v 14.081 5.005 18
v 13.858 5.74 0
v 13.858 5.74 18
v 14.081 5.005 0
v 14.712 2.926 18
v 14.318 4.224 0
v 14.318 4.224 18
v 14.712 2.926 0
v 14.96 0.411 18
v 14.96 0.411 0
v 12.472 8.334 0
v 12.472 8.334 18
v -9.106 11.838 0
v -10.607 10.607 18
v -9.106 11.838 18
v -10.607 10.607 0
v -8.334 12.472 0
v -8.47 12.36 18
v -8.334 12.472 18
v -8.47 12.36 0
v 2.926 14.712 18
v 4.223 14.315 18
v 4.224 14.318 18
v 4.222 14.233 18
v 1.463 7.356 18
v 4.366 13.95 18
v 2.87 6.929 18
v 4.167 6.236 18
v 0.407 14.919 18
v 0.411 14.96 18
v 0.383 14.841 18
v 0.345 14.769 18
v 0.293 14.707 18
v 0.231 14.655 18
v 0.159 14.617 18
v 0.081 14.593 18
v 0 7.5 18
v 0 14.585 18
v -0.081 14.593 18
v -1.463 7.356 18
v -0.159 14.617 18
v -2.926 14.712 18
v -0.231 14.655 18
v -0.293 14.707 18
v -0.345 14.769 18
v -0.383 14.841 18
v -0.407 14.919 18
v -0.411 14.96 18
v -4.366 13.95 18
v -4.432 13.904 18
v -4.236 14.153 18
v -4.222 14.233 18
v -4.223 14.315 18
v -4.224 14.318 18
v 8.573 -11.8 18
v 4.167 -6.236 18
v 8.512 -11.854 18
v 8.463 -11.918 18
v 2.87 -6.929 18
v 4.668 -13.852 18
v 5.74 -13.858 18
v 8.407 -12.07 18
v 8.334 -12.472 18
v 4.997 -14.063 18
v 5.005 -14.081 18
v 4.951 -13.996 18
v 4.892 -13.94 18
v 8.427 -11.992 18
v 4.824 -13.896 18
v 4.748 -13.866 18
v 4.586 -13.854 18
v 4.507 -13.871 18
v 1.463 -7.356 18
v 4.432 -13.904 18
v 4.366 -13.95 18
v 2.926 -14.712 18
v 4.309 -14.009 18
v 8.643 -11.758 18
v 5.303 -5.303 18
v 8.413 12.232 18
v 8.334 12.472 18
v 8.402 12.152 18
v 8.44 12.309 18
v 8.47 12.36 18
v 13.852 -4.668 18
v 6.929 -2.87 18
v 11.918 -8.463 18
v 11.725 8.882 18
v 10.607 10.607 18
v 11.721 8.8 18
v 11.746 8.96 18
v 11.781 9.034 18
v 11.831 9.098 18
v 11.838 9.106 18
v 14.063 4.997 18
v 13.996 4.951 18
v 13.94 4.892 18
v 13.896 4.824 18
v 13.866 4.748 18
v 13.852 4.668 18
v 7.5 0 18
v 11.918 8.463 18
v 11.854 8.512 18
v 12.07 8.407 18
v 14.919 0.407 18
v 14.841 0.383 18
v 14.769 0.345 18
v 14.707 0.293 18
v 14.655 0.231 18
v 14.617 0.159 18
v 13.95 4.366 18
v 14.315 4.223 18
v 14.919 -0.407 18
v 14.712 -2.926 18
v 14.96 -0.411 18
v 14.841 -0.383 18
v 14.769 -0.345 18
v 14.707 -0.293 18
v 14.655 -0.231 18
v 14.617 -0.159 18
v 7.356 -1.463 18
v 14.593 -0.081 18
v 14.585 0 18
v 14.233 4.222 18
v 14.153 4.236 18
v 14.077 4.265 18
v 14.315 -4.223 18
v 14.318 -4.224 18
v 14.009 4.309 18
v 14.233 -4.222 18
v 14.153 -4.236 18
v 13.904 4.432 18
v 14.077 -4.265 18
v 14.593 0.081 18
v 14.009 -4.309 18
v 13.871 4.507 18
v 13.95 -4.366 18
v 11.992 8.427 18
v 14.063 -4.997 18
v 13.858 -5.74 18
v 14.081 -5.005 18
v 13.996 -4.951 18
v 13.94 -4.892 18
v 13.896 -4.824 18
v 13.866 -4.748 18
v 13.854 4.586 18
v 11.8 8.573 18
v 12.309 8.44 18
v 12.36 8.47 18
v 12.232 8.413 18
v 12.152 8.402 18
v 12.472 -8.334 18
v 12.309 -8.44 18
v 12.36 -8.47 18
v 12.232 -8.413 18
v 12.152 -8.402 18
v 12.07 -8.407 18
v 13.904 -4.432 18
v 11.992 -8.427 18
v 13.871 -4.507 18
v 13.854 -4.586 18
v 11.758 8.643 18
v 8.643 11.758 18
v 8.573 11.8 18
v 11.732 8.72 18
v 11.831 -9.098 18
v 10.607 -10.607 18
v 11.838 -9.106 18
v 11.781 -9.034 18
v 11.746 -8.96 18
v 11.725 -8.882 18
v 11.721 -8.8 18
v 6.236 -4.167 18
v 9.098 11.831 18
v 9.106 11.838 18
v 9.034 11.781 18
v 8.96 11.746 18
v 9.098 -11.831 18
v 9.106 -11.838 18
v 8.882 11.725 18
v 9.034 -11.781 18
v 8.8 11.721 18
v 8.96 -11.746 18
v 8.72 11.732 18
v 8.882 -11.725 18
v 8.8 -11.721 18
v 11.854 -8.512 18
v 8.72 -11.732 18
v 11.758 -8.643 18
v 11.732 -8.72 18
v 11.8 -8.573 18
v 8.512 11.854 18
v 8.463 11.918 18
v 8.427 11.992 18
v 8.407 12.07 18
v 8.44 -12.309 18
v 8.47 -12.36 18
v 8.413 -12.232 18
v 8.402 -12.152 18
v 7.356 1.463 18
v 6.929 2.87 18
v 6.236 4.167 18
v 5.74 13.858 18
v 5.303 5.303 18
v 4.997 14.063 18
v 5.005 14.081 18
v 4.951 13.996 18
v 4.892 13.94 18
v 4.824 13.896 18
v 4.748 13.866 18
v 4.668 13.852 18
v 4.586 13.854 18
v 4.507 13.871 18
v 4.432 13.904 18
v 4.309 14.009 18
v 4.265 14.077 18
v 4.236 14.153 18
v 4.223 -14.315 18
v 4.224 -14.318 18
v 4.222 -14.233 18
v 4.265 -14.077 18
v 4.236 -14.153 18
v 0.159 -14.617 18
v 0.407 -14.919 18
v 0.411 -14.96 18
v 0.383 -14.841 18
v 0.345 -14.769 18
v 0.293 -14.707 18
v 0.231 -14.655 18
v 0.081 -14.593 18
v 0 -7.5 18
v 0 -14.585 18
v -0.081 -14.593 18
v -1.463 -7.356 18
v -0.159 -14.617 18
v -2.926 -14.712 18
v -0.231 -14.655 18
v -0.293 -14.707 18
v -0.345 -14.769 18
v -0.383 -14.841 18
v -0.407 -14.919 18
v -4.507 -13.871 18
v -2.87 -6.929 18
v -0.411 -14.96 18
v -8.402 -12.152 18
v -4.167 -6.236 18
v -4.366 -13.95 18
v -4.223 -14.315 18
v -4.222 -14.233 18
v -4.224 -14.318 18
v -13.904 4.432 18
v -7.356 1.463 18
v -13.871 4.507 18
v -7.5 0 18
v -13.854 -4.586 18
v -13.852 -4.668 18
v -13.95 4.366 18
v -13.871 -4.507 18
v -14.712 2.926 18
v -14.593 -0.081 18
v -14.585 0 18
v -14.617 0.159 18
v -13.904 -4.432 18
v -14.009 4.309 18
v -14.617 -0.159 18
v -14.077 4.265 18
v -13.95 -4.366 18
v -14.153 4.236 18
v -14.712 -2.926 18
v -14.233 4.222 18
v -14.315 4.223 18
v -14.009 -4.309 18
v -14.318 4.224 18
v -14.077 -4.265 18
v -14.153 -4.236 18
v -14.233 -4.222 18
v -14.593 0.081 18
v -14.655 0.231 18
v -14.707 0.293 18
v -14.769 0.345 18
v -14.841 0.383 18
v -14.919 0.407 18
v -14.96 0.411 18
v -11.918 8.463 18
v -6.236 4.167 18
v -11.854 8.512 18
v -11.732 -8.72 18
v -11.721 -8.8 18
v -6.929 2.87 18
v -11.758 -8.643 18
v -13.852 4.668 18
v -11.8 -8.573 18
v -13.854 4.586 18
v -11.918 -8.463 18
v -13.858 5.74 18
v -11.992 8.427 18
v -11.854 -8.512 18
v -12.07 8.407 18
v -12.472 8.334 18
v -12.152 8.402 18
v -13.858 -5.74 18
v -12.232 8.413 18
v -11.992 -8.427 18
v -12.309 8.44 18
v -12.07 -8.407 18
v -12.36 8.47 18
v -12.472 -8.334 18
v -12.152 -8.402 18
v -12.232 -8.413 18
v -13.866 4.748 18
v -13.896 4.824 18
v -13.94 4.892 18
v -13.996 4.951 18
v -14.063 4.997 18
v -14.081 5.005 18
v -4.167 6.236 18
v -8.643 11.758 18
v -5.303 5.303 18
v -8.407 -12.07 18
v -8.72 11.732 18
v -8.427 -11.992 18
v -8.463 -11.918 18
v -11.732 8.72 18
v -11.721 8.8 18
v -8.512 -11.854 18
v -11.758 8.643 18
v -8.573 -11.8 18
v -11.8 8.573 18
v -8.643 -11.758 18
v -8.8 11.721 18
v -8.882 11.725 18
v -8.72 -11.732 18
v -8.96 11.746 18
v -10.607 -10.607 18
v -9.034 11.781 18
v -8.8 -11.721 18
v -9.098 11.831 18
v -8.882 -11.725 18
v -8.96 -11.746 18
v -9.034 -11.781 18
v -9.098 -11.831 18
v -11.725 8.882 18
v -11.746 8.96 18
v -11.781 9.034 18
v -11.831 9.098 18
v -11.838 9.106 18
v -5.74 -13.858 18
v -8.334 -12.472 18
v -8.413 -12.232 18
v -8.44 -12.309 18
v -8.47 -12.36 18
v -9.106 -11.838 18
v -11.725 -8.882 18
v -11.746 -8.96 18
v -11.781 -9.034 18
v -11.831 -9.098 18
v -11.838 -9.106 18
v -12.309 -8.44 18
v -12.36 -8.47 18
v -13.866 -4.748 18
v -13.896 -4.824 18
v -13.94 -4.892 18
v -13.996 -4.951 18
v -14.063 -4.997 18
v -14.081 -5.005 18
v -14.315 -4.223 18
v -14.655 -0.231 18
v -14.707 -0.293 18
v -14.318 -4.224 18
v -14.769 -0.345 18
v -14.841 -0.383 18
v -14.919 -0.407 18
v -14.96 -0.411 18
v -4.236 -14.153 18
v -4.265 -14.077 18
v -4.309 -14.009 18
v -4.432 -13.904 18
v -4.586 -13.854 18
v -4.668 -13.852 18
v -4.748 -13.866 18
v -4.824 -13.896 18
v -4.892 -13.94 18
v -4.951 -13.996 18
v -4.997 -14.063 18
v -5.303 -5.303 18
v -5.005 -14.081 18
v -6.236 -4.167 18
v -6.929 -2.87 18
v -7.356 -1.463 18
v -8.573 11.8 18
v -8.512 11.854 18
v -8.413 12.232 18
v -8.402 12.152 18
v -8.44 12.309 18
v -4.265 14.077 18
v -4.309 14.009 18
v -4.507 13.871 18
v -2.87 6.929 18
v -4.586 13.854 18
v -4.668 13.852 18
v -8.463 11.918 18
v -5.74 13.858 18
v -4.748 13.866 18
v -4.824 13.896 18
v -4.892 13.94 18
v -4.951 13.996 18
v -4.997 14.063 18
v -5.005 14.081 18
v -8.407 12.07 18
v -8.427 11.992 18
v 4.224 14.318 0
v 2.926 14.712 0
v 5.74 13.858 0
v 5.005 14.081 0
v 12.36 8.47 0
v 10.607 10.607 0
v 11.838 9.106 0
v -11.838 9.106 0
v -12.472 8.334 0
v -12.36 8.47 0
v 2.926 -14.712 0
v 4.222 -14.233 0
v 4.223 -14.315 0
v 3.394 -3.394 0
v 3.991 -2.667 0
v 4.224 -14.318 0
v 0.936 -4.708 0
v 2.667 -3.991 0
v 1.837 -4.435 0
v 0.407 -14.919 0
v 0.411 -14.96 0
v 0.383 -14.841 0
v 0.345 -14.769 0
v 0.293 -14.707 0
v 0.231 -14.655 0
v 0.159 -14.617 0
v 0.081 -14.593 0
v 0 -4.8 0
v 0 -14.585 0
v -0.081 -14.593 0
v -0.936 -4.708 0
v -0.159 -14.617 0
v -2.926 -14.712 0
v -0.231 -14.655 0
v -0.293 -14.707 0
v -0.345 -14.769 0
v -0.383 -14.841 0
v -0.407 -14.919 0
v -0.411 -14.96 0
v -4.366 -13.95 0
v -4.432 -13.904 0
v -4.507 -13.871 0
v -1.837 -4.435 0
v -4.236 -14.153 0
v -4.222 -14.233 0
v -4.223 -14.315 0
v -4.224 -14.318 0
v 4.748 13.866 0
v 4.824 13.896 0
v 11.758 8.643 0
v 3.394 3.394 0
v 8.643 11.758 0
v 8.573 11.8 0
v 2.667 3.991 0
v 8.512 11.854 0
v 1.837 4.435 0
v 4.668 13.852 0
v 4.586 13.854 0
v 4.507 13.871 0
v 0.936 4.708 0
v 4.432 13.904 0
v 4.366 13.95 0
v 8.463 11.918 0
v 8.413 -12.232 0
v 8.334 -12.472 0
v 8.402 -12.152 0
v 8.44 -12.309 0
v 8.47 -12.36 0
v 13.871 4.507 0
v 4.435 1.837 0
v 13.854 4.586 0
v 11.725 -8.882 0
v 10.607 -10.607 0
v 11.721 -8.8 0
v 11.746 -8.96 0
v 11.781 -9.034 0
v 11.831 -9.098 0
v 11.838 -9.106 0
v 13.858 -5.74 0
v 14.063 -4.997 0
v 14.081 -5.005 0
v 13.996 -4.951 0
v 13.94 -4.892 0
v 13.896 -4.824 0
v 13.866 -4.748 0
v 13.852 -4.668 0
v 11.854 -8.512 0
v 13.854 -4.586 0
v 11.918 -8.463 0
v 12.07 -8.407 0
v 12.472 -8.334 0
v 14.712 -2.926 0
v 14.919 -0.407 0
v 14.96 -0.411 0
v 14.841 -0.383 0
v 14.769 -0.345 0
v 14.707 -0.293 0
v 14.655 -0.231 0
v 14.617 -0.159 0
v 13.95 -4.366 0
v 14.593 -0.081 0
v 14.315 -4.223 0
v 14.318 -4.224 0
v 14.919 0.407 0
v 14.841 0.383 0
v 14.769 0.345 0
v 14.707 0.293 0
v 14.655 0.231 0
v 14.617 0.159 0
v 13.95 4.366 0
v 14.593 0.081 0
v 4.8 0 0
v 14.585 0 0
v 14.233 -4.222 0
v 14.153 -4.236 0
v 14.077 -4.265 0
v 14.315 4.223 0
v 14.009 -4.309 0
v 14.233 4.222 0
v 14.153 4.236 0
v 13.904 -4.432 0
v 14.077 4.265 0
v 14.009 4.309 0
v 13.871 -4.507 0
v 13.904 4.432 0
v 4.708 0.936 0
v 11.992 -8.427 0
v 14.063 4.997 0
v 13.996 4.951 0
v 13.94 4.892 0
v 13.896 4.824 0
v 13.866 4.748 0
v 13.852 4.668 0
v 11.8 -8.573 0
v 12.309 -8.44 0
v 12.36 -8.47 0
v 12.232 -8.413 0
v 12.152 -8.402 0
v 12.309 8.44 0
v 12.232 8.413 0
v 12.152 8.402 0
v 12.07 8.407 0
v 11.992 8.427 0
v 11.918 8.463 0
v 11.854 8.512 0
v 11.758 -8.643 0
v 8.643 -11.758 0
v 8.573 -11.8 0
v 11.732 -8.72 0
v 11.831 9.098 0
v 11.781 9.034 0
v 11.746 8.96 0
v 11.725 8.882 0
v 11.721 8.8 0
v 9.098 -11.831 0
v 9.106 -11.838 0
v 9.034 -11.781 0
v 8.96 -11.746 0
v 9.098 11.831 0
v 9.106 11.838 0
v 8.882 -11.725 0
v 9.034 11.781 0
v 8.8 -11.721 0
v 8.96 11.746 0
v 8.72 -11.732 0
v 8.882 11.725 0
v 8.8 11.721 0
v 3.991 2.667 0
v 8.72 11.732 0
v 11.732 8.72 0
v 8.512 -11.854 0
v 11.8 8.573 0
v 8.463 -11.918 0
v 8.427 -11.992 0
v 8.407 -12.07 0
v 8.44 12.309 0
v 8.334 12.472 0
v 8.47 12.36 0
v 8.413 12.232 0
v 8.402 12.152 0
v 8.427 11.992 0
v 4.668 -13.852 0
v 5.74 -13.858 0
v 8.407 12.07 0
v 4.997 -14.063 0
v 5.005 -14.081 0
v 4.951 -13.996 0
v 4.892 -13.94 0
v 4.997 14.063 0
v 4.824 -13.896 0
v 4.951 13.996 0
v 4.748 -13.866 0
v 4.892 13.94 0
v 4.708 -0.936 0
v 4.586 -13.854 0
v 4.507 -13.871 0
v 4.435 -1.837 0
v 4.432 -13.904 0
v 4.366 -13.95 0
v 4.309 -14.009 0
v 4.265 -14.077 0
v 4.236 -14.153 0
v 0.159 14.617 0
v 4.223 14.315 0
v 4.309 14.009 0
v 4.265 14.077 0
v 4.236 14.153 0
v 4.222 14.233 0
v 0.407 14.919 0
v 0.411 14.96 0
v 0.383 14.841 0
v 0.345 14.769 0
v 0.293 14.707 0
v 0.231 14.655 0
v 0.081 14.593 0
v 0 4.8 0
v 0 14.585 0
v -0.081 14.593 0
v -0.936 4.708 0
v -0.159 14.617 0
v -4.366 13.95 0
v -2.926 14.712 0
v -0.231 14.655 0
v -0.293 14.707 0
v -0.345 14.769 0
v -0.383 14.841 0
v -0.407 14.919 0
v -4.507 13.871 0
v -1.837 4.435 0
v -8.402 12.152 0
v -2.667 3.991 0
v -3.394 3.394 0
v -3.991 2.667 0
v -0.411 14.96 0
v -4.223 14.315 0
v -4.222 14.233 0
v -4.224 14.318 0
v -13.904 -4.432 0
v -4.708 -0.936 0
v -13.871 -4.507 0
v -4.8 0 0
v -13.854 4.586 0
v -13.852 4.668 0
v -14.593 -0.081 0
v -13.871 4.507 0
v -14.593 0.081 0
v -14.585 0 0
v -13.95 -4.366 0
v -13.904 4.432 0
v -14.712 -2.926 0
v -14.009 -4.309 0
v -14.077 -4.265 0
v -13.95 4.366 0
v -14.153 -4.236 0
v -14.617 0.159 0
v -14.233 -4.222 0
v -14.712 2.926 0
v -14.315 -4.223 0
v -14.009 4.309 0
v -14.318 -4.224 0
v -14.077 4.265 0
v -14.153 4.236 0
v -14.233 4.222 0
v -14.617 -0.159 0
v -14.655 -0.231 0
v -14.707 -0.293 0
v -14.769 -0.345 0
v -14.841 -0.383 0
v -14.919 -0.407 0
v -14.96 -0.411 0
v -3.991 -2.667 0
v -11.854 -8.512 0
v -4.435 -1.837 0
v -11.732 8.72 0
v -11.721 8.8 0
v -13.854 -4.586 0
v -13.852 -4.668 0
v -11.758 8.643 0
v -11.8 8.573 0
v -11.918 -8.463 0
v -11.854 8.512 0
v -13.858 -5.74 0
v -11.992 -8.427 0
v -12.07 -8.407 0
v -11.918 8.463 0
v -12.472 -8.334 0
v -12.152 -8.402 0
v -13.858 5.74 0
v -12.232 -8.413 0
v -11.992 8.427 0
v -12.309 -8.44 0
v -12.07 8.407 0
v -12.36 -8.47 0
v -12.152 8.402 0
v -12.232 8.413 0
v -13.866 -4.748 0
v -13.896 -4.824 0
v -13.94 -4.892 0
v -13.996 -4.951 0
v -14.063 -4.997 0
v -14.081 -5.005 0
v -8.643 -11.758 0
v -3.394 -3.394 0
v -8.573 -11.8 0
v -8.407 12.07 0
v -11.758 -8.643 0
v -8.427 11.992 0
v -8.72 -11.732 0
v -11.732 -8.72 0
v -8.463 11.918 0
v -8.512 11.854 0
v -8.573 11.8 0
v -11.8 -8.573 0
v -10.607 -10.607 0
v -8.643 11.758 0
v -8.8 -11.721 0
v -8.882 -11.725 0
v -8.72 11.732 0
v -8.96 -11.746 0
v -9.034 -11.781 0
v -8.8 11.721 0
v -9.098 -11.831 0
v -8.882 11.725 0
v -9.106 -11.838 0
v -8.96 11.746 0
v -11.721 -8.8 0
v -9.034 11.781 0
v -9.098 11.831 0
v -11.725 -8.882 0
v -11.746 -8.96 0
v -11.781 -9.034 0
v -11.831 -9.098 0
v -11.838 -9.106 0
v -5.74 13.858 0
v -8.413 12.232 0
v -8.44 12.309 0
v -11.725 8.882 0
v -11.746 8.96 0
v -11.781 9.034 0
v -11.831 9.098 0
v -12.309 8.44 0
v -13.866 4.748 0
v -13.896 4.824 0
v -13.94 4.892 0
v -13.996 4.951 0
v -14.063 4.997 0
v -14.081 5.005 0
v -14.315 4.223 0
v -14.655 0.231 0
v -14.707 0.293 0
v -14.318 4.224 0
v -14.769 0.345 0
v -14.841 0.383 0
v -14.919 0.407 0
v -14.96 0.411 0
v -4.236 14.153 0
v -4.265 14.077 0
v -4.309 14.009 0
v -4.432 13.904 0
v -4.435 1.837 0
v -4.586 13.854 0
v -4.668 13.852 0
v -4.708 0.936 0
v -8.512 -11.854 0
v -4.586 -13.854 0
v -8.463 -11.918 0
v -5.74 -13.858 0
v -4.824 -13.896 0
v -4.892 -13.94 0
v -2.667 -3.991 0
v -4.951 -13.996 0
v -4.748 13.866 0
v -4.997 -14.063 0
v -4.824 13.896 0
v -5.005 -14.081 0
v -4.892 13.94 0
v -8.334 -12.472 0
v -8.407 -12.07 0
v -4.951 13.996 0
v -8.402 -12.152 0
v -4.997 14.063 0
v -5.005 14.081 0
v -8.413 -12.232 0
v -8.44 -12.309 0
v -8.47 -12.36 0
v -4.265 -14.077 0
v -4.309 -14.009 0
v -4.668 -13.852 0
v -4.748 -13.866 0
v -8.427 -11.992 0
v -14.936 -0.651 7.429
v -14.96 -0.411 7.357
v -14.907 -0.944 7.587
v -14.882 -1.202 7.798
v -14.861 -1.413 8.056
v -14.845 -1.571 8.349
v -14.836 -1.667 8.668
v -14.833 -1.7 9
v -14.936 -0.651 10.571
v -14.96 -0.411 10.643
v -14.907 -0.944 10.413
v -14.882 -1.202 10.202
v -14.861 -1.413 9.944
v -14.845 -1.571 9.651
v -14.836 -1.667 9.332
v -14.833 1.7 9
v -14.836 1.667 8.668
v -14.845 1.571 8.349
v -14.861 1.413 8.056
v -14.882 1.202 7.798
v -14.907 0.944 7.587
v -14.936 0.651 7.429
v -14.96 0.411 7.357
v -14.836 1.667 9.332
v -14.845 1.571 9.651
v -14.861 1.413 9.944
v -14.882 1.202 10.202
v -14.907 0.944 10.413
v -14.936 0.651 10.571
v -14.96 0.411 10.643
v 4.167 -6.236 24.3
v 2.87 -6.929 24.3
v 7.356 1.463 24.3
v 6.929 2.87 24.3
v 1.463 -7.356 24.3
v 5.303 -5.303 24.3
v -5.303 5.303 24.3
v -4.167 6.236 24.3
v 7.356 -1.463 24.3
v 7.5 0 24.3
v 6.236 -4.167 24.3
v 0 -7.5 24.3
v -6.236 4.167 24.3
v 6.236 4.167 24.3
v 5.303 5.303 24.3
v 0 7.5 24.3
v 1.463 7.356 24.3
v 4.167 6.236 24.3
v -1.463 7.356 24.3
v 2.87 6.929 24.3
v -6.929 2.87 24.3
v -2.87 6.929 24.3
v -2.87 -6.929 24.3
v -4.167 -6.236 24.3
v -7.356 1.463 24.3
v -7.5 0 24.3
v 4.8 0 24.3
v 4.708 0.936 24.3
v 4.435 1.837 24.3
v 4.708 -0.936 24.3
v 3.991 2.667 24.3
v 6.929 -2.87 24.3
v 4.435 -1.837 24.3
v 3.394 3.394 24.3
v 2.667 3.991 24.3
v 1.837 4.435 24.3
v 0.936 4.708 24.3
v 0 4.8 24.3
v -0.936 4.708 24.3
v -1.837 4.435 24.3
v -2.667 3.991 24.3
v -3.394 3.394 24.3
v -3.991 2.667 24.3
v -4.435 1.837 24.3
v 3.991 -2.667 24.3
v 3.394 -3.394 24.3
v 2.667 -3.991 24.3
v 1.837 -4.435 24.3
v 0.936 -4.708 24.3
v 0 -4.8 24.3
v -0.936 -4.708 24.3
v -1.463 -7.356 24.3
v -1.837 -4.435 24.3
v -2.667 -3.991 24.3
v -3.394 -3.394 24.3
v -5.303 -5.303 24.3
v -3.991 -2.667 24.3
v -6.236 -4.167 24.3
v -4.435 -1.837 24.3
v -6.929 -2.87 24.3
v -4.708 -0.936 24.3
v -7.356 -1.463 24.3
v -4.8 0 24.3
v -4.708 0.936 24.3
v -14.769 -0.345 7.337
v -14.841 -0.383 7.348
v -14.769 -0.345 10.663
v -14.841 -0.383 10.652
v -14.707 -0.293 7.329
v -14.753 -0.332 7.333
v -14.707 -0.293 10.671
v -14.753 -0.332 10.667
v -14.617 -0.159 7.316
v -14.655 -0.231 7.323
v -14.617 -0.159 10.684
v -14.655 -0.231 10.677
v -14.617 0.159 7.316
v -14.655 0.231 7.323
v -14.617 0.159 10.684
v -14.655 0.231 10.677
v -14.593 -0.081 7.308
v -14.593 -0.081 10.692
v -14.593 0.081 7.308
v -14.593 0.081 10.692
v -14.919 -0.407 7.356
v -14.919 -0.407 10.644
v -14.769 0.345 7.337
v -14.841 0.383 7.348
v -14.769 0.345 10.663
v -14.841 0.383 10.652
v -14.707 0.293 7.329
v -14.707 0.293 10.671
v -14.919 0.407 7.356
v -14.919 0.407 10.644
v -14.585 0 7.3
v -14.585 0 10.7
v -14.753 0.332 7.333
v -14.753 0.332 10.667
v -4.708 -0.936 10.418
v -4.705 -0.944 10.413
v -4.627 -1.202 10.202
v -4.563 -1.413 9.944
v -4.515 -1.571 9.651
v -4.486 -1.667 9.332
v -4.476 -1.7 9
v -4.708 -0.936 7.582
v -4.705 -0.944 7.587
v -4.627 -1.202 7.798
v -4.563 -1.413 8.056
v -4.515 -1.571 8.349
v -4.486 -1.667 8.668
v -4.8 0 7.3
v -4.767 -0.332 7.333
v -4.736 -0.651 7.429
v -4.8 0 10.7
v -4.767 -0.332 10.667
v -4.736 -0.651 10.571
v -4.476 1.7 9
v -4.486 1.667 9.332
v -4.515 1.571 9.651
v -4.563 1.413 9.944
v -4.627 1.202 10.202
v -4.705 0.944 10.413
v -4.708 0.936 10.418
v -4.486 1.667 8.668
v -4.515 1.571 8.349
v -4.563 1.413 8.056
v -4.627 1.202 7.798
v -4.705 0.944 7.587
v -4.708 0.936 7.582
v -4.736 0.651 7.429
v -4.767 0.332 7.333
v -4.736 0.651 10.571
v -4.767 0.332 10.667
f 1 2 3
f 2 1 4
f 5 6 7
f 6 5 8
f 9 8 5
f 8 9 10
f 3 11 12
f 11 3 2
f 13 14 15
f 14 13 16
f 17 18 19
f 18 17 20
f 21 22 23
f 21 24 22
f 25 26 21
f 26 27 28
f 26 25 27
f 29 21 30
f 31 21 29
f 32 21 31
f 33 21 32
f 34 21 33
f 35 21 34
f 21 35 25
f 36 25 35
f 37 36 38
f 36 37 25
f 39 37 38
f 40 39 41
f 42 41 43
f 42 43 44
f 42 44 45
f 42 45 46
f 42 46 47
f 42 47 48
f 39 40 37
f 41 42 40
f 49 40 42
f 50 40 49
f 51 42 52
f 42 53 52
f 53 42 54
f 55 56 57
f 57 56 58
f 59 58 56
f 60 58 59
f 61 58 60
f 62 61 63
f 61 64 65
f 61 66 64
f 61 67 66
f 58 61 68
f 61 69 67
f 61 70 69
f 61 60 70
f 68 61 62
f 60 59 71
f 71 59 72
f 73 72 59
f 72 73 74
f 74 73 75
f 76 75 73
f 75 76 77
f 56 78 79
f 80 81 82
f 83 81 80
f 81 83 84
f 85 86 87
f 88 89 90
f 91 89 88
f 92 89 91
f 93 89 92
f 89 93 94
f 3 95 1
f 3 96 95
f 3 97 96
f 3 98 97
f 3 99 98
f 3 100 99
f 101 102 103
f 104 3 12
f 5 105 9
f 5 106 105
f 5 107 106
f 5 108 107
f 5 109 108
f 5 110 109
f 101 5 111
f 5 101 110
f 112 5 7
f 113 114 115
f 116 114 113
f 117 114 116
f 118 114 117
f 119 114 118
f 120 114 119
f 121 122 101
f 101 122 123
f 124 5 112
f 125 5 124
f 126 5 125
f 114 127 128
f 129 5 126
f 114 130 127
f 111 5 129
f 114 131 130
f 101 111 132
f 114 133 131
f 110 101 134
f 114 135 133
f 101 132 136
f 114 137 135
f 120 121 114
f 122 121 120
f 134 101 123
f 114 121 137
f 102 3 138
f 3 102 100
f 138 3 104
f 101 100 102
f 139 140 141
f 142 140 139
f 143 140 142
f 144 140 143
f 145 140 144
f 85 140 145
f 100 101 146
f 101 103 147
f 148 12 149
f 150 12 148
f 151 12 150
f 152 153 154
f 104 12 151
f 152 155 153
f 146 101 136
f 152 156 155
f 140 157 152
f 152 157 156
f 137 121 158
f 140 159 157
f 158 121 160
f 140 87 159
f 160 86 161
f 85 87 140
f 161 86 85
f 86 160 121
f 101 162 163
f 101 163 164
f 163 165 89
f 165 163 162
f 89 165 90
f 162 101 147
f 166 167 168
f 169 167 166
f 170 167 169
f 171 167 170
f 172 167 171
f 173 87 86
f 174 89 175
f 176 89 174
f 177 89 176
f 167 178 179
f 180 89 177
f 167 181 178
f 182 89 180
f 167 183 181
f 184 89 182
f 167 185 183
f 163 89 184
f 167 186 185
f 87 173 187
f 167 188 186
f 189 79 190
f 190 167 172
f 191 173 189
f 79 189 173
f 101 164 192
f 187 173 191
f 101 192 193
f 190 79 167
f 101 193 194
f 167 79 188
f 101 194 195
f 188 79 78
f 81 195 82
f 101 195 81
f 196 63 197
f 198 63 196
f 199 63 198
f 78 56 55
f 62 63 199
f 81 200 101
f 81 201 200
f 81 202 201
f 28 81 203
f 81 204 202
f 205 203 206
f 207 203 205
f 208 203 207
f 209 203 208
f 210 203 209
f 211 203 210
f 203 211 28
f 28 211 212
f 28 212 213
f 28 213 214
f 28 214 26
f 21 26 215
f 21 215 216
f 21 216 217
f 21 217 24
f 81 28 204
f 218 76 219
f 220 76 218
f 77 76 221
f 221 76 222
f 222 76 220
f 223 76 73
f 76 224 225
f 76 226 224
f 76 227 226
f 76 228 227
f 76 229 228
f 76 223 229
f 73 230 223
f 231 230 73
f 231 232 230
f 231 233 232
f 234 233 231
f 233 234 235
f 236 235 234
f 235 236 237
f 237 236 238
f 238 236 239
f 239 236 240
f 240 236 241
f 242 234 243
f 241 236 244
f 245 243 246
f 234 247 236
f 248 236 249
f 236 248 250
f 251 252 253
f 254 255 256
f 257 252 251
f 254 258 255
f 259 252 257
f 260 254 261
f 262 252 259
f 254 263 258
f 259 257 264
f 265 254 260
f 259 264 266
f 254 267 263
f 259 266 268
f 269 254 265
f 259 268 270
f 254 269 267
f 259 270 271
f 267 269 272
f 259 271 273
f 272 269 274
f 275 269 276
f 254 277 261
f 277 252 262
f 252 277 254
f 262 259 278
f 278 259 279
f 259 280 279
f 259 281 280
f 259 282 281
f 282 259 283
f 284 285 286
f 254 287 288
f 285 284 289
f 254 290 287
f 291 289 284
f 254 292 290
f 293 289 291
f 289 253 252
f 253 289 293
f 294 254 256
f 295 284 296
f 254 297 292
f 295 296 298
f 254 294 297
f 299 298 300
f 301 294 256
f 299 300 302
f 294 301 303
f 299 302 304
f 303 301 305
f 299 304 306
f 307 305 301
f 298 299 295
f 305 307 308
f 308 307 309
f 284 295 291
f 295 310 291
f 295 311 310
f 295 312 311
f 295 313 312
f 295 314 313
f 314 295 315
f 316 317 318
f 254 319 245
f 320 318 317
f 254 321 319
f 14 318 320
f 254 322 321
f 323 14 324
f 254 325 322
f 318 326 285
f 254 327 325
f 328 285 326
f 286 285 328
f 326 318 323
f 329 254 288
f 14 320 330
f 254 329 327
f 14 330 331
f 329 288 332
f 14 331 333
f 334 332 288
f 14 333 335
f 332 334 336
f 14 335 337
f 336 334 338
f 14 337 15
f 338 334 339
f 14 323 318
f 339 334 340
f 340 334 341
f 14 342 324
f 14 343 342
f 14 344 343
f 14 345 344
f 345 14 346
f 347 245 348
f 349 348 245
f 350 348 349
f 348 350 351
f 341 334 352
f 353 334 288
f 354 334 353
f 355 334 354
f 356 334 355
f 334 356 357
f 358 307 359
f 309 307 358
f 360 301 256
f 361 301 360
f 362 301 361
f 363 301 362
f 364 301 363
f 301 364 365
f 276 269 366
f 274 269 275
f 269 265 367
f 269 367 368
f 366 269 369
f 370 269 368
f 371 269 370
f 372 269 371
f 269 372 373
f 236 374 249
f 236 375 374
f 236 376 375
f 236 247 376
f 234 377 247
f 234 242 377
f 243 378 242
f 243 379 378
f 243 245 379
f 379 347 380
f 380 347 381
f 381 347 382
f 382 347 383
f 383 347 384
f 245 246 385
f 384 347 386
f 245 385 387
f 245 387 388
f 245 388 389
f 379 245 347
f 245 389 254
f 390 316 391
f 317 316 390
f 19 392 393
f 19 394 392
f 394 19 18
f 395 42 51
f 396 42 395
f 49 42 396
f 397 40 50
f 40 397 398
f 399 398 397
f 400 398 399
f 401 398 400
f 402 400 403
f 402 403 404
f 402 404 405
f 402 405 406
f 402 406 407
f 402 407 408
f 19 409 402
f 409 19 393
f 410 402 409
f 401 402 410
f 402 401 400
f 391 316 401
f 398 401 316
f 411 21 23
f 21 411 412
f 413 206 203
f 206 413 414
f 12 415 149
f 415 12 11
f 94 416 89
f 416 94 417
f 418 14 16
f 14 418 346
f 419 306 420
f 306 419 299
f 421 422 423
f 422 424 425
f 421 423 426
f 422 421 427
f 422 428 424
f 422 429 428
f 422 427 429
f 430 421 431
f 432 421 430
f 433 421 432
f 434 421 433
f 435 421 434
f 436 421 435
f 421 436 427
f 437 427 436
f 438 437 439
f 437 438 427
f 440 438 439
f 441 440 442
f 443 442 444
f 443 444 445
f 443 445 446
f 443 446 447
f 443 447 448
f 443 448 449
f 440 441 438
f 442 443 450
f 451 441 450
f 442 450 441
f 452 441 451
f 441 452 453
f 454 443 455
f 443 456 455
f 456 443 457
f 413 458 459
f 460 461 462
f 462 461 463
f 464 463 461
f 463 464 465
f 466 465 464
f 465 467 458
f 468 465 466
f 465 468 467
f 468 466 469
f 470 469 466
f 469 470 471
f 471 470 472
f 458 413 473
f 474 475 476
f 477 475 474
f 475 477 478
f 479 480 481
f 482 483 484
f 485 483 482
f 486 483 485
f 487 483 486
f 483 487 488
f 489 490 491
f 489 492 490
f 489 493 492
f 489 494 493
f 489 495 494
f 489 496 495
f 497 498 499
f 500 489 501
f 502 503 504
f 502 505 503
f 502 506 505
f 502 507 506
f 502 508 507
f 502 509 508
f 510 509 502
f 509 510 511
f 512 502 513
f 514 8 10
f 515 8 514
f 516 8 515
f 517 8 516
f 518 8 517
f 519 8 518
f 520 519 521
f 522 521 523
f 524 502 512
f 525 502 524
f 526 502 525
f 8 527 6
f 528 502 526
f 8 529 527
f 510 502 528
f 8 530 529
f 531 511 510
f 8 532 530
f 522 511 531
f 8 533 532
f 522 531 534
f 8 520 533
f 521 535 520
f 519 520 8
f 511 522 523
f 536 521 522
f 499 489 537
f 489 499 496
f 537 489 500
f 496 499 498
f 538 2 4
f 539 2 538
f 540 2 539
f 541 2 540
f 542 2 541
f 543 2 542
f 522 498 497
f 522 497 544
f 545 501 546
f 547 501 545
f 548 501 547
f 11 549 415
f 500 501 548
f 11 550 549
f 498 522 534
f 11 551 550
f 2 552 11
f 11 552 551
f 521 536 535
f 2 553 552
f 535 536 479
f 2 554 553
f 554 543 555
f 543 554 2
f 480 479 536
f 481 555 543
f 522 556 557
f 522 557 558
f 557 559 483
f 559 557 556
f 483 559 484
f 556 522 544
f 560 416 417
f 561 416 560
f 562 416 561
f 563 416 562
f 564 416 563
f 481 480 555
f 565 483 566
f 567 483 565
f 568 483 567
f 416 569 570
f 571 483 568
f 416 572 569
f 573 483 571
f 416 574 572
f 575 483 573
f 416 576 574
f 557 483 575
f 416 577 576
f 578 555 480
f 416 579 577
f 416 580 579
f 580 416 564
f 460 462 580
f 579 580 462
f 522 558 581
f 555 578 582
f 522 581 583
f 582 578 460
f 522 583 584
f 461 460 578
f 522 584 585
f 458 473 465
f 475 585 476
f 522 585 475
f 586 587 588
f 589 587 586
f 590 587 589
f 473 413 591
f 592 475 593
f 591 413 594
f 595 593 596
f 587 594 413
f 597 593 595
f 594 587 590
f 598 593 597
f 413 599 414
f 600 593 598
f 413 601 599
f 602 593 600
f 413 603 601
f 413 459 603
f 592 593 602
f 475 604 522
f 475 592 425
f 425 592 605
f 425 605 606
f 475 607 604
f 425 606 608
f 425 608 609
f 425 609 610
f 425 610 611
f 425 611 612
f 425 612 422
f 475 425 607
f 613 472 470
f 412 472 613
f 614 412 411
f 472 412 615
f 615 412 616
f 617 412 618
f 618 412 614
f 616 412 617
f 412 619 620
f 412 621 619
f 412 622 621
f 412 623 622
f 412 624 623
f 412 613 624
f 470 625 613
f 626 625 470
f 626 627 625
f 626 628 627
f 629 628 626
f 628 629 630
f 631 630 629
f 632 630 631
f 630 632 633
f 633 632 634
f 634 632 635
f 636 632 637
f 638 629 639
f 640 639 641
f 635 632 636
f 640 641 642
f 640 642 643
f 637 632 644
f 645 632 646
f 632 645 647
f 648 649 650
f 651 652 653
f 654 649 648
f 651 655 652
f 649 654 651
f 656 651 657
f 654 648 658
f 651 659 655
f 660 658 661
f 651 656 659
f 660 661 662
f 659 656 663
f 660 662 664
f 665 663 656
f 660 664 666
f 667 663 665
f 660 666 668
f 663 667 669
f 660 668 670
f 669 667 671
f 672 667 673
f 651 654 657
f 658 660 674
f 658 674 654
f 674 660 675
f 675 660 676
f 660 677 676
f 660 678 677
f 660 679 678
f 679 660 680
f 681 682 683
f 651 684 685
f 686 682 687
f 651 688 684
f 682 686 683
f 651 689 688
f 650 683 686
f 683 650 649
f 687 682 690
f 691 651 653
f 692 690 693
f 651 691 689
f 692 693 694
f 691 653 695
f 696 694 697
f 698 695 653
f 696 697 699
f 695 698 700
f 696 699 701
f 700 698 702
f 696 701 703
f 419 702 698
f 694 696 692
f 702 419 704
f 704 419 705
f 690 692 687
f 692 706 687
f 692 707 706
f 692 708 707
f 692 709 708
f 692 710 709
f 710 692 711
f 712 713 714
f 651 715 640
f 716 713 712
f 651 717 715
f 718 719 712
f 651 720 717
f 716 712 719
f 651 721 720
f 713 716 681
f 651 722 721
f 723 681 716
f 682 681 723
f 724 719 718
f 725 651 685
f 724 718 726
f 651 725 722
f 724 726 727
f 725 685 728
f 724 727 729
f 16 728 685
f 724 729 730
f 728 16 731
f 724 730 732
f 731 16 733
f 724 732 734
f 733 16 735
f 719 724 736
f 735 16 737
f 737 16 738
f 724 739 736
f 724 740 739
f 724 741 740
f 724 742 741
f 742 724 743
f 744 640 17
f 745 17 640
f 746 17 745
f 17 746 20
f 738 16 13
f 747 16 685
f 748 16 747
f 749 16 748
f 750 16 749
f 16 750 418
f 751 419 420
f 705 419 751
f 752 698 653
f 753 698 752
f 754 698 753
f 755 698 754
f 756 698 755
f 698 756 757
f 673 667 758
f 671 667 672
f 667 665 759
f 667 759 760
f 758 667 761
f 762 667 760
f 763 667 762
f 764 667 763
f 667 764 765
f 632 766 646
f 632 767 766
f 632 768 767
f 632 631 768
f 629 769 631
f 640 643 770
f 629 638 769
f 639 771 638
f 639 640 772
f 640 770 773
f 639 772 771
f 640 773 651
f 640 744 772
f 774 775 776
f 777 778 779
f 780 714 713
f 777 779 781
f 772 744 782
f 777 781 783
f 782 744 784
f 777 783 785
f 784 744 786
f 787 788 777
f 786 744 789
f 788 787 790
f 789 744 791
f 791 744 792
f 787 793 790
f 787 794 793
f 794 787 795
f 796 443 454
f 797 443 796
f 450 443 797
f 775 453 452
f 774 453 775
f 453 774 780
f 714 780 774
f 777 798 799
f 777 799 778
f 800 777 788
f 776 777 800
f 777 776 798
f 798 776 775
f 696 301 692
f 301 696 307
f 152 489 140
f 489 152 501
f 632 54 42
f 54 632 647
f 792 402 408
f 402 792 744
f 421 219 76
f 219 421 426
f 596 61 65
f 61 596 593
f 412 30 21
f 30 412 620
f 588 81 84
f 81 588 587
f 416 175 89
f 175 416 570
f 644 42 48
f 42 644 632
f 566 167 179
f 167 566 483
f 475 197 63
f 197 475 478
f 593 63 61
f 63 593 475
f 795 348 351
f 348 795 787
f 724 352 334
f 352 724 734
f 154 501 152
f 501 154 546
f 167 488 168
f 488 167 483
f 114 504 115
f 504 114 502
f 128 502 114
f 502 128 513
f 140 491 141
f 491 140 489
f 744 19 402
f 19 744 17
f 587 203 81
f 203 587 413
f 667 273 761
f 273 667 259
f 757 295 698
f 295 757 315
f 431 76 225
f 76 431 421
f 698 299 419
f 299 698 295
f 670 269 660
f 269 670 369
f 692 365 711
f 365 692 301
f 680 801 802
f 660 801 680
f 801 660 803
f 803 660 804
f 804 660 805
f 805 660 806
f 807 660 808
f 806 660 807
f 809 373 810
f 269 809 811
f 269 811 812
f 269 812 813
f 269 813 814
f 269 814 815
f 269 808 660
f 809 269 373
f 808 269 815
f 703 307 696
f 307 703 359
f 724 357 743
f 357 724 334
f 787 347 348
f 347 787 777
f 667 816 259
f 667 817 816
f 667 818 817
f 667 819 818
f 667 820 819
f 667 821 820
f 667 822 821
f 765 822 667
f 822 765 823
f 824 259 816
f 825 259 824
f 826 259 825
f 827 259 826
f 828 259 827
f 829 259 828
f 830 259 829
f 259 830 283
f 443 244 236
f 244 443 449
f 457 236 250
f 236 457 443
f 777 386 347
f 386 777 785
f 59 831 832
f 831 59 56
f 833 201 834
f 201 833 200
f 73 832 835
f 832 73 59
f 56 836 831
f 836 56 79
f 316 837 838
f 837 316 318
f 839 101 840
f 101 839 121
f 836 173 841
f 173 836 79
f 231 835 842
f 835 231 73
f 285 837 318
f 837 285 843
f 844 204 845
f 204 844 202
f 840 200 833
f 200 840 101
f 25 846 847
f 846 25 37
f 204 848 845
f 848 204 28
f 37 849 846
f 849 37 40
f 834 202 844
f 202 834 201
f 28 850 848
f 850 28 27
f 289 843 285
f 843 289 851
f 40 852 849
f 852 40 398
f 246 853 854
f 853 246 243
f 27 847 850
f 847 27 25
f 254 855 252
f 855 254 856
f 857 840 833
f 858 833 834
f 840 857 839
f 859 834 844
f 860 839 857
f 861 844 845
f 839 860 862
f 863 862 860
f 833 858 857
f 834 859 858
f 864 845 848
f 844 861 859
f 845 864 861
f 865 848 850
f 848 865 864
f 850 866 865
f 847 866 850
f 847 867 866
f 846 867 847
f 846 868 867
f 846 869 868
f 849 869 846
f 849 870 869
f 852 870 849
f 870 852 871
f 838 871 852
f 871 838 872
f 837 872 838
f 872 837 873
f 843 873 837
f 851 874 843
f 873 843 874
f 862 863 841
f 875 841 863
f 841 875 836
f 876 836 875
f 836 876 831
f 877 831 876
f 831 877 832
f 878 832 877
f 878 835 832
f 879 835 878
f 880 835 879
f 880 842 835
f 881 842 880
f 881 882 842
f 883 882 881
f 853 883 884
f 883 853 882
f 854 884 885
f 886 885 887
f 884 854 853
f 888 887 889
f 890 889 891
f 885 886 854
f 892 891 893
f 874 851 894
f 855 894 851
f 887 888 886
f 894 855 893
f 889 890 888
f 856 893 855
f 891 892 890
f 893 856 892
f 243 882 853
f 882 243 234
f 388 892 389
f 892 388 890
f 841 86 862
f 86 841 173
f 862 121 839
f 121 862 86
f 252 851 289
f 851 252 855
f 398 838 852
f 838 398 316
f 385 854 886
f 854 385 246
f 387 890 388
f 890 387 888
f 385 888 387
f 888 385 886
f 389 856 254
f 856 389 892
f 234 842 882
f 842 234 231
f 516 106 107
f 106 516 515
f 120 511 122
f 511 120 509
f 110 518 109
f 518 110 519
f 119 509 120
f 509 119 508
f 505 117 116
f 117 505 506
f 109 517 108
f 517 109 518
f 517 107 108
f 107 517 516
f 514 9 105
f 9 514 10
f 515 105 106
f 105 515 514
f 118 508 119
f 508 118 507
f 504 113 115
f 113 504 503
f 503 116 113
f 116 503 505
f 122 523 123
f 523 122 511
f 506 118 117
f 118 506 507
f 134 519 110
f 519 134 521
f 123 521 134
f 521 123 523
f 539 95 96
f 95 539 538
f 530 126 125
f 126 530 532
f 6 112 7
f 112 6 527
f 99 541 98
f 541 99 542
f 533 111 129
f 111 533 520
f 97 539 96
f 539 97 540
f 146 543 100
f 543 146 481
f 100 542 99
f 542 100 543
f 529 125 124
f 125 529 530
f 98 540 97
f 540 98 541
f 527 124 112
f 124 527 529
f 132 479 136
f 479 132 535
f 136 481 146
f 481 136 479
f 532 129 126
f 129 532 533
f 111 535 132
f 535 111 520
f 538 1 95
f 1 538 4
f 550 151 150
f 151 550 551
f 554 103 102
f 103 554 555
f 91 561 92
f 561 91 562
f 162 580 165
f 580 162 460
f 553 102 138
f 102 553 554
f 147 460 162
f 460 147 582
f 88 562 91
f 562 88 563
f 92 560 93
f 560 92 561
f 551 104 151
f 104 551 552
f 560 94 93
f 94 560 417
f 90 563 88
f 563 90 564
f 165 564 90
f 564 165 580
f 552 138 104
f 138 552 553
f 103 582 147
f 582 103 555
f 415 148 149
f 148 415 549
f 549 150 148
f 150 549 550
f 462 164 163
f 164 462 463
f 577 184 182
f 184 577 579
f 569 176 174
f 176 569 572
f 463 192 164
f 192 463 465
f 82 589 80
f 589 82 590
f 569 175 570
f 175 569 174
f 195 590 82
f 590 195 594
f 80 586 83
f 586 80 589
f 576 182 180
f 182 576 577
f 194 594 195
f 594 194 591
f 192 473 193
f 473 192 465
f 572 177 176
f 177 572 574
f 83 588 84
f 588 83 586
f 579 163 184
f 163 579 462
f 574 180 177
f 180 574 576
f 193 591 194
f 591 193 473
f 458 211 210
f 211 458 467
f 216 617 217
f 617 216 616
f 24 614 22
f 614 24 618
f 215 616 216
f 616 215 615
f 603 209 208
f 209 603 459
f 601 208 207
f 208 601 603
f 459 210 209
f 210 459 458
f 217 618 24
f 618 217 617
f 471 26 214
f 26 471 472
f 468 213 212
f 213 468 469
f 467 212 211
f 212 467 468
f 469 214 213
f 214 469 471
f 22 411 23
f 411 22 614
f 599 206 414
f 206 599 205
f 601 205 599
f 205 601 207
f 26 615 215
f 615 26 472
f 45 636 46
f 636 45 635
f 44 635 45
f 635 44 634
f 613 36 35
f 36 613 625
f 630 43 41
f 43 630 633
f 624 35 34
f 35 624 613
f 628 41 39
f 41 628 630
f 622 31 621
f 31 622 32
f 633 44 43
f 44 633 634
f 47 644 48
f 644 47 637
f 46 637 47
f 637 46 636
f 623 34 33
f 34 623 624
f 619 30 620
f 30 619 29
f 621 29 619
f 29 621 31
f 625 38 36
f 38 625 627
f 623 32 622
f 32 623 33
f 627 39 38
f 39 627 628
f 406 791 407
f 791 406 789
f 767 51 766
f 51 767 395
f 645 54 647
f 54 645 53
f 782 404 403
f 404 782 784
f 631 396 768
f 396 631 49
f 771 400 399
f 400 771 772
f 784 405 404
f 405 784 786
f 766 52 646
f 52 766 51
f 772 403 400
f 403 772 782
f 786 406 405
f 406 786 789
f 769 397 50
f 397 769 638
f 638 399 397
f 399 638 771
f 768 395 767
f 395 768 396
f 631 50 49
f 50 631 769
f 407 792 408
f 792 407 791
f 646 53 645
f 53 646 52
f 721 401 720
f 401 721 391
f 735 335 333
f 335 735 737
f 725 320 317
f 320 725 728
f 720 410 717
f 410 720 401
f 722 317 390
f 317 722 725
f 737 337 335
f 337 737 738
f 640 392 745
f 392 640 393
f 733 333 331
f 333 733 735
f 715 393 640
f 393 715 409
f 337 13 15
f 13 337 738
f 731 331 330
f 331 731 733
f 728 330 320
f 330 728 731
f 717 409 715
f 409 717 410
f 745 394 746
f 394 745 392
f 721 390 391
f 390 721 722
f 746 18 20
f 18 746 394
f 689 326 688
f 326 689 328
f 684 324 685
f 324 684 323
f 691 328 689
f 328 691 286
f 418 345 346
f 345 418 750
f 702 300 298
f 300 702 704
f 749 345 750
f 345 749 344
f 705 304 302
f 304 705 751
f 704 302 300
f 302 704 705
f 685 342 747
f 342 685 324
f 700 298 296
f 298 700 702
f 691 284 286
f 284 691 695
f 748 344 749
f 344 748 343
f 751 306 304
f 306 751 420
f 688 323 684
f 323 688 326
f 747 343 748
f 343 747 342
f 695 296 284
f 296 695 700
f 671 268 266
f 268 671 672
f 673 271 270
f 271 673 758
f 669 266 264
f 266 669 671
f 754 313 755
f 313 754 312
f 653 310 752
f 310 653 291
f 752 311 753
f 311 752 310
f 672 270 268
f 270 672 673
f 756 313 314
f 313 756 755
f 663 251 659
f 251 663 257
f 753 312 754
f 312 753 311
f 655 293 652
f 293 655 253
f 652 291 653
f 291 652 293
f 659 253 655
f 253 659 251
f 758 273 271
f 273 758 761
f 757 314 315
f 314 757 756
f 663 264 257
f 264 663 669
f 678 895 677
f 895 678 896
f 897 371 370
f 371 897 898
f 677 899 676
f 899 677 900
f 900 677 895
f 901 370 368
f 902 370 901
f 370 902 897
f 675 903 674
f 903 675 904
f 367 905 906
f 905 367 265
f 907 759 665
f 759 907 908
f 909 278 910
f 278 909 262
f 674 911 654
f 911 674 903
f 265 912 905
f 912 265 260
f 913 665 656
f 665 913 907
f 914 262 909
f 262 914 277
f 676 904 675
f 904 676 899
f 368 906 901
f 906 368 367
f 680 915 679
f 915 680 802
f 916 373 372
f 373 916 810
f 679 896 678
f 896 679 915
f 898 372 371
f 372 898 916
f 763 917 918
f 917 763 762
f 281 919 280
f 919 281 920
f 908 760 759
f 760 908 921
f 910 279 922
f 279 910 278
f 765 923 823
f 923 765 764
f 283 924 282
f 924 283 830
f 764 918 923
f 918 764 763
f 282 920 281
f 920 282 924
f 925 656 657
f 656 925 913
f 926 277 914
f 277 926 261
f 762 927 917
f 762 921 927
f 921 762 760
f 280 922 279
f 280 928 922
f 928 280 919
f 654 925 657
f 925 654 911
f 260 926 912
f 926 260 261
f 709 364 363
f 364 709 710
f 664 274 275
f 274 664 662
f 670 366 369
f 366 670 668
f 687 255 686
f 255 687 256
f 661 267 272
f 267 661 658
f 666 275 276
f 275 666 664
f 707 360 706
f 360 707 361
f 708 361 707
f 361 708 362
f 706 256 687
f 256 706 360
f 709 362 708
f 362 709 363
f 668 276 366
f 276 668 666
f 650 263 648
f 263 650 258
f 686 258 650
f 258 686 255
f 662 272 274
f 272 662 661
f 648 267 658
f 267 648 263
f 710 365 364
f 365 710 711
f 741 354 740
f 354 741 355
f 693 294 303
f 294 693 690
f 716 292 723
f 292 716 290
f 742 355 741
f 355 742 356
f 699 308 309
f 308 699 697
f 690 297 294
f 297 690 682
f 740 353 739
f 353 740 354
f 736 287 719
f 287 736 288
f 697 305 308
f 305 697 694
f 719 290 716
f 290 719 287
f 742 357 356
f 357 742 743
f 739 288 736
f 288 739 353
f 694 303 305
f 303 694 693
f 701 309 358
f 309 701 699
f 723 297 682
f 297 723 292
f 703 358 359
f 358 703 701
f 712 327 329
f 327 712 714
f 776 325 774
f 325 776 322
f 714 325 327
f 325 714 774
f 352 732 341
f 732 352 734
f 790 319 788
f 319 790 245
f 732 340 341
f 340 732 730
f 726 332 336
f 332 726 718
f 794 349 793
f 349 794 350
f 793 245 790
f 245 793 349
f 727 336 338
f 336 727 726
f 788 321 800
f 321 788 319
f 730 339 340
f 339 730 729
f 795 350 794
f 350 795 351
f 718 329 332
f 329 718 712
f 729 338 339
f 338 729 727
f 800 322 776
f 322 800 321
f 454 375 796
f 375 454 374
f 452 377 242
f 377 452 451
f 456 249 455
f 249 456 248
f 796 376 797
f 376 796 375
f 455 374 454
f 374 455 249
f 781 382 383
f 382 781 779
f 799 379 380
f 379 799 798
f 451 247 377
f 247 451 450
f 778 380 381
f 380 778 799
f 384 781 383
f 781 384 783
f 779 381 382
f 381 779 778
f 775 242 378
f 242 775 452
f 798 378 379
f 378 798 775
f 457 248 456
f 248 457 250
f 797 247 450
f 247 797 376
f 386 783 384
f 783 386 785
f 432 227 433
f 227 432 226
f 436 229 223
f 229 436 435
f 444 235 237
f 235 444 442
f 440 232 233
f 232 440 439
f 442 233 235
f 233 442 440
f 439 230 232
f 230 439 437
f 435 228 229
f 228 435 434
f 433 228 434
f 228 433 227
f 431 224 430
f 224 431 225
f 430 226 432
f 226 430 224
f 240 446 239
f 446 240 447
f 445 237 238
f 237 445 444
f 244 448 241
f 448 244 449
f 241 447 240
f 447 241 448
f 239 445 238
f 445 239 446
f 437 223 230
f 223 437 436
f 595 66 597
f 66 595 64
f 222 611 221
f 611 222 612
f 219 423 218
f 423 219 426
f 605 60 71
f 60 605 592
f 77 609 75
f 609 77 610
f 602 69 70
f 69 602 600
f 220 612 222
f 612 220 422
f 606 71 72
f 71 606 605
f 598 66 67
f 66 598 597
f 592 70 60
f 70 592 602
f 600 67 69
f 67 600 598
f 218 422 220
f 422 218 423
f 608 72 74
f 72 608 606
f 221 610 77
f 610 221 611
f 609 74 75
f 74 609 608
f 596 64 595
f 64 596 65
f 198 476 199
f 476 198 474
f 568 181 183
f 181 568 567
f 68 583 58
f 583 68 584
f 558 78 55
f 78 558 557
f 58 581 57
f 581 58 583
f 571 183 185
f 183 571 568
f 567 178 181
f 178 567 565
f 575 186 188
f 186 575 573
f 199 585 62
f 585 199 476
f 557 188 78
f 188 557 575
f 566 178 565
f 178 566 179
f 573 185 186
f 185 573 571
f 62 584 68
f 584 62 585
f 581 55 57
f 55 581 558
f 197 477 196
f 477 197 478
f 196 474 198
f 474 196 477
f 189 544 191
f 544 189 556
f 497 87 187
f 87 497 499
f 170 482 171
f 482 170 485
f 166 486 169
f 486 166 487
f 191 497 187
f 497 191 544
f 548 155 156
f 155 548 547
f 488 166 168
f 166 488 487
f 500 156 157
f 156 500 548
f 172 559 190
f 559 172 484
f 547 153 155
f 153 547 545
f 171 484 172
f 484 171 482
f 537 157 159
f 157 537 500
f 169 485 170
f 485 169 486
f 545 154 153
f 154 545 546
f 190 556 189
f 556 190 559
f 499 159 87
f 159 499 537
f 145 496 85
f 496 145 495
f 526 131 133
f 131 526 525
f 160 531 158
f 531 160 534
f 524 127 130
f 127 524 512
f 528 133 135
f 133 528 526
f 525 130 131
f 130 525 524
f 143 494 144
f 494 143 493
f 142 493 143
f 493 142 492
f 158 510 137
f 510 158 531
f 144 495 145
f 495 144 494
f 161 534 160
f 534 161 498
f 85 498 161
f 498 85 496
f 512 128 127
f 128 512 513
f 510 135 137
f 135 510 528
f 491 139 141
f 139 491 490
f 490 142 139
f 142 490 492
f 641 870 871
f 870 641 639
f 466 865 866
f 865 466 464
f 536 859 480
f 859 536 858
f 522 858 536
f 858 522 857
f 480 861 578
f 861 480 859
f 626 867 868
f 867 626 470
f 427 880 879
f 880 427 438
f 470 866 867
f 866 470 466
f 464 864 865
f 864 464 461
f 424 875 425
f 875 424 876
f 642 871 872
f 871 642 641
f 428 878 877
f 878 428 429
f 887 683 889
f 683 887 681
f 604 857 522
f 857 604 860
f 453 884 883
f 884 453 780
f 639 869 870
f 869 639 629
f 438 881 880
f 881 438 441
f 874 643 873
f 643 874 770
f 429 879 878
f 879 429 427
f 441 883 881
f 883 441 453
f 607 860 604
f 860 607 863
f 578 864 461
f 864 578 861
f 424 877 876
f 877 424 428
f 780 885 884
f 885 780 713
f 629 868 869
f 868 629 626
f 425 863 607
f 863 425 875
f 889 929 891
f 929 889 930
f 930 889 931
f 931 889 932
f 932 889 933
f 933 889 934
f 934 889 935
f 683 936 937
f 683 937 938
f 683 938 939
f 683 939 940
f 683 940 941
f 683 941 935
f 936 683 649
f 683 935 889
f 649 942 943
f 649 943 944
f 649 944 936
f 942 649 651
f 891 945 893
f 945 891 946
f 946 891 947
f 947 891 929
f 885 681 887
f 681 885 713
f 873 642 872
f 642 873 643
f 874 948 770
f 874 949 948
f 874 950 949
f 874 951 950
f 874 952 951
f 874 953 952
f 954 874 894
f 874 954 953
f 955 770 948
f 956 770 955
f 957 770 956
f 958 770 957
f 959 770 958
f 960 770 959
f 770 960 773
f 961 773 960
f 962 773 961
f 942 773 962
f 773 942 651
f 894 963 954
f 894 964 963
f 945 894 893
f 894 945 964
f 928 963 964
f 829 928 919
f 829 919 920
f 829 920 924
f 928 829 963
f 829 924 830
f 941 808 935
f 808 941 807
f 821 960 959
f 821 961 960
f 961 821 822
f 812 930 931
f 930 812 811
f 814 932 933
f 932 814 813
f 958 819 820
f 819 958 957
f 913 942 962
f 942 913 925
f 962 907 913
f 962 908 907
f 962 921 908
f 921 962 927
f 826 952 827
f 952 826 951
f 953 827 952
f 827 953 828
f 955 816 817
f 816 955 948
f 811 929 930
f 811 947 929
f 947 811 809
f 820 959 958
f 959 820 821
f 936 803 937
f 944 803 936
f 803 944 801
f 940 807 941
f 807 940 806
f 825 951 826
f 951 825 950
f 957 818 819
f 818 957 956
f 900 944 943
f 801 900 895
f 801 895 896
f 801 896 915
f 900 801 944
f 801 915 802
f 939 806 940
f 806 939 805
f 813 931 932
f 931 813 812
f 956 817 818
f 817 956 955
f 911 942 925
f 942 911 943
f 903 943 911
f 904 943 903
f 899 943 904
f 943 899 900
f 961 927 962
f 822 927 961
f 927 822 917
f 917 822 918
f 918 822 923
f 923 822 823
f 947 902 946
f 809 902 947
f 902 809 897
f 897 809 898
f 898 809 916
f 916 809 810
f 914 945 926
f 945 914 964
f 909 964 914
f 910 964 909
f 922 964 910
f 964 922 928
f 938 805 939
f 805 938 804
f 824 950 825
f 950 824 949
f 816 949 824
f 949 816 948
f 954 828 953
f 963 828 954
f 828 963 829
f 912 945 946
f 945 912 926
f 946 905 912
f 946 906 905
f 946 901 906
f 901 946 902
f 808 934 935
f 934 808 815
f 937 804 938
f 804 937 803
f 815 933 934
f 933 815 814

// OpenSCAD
$fn = 32;

// ----------------------------------------------------------------------
// Hand knob: 30 x 30 x 24.3 mm
// ----------------------------------------------------------------------

// --- parameters (mm) ---
head_d = 30;              // knob diameter
head_h = 18;              // knob height
hole_d = 9.6;             // shaft bore
set_d = 3.4;              // set screw tap hole
notch_d = 0.83;           // knurl groove diameter
knurl_n = 20;             // number of knurl grooves
cap_h = 6.3;              // raised centre cap
cap_d = 15;               // centre cap diameter

module body() {
  cylinder(h = head_h, d = head_d);
}

module cap() {
  translate([0, 0, head_h - 1]) cylinder(h = cap_h + 1, d = cap_d);
}

difference() {
  union() {
    body();
    cap();
  }
  translate([0, 0, -1]) cylinder(h = head_h + cap_h + 2, d = hole_d);
  /* knurl grooves */
  for (i = [0 : knurl_n - 1])
    rotate([0, 0, i * 360 / knurl_n])
      translate([head_d / 2, 0, -0.5])
        cylinder(h = head_h + 1, d = notch_d);
  translate([-head_d / 2 - 1, 0, head_h * 0.5]) rotate([0, 90, 0]) cylinder(h = head_d / 2 + 2, d = set_d);
}
